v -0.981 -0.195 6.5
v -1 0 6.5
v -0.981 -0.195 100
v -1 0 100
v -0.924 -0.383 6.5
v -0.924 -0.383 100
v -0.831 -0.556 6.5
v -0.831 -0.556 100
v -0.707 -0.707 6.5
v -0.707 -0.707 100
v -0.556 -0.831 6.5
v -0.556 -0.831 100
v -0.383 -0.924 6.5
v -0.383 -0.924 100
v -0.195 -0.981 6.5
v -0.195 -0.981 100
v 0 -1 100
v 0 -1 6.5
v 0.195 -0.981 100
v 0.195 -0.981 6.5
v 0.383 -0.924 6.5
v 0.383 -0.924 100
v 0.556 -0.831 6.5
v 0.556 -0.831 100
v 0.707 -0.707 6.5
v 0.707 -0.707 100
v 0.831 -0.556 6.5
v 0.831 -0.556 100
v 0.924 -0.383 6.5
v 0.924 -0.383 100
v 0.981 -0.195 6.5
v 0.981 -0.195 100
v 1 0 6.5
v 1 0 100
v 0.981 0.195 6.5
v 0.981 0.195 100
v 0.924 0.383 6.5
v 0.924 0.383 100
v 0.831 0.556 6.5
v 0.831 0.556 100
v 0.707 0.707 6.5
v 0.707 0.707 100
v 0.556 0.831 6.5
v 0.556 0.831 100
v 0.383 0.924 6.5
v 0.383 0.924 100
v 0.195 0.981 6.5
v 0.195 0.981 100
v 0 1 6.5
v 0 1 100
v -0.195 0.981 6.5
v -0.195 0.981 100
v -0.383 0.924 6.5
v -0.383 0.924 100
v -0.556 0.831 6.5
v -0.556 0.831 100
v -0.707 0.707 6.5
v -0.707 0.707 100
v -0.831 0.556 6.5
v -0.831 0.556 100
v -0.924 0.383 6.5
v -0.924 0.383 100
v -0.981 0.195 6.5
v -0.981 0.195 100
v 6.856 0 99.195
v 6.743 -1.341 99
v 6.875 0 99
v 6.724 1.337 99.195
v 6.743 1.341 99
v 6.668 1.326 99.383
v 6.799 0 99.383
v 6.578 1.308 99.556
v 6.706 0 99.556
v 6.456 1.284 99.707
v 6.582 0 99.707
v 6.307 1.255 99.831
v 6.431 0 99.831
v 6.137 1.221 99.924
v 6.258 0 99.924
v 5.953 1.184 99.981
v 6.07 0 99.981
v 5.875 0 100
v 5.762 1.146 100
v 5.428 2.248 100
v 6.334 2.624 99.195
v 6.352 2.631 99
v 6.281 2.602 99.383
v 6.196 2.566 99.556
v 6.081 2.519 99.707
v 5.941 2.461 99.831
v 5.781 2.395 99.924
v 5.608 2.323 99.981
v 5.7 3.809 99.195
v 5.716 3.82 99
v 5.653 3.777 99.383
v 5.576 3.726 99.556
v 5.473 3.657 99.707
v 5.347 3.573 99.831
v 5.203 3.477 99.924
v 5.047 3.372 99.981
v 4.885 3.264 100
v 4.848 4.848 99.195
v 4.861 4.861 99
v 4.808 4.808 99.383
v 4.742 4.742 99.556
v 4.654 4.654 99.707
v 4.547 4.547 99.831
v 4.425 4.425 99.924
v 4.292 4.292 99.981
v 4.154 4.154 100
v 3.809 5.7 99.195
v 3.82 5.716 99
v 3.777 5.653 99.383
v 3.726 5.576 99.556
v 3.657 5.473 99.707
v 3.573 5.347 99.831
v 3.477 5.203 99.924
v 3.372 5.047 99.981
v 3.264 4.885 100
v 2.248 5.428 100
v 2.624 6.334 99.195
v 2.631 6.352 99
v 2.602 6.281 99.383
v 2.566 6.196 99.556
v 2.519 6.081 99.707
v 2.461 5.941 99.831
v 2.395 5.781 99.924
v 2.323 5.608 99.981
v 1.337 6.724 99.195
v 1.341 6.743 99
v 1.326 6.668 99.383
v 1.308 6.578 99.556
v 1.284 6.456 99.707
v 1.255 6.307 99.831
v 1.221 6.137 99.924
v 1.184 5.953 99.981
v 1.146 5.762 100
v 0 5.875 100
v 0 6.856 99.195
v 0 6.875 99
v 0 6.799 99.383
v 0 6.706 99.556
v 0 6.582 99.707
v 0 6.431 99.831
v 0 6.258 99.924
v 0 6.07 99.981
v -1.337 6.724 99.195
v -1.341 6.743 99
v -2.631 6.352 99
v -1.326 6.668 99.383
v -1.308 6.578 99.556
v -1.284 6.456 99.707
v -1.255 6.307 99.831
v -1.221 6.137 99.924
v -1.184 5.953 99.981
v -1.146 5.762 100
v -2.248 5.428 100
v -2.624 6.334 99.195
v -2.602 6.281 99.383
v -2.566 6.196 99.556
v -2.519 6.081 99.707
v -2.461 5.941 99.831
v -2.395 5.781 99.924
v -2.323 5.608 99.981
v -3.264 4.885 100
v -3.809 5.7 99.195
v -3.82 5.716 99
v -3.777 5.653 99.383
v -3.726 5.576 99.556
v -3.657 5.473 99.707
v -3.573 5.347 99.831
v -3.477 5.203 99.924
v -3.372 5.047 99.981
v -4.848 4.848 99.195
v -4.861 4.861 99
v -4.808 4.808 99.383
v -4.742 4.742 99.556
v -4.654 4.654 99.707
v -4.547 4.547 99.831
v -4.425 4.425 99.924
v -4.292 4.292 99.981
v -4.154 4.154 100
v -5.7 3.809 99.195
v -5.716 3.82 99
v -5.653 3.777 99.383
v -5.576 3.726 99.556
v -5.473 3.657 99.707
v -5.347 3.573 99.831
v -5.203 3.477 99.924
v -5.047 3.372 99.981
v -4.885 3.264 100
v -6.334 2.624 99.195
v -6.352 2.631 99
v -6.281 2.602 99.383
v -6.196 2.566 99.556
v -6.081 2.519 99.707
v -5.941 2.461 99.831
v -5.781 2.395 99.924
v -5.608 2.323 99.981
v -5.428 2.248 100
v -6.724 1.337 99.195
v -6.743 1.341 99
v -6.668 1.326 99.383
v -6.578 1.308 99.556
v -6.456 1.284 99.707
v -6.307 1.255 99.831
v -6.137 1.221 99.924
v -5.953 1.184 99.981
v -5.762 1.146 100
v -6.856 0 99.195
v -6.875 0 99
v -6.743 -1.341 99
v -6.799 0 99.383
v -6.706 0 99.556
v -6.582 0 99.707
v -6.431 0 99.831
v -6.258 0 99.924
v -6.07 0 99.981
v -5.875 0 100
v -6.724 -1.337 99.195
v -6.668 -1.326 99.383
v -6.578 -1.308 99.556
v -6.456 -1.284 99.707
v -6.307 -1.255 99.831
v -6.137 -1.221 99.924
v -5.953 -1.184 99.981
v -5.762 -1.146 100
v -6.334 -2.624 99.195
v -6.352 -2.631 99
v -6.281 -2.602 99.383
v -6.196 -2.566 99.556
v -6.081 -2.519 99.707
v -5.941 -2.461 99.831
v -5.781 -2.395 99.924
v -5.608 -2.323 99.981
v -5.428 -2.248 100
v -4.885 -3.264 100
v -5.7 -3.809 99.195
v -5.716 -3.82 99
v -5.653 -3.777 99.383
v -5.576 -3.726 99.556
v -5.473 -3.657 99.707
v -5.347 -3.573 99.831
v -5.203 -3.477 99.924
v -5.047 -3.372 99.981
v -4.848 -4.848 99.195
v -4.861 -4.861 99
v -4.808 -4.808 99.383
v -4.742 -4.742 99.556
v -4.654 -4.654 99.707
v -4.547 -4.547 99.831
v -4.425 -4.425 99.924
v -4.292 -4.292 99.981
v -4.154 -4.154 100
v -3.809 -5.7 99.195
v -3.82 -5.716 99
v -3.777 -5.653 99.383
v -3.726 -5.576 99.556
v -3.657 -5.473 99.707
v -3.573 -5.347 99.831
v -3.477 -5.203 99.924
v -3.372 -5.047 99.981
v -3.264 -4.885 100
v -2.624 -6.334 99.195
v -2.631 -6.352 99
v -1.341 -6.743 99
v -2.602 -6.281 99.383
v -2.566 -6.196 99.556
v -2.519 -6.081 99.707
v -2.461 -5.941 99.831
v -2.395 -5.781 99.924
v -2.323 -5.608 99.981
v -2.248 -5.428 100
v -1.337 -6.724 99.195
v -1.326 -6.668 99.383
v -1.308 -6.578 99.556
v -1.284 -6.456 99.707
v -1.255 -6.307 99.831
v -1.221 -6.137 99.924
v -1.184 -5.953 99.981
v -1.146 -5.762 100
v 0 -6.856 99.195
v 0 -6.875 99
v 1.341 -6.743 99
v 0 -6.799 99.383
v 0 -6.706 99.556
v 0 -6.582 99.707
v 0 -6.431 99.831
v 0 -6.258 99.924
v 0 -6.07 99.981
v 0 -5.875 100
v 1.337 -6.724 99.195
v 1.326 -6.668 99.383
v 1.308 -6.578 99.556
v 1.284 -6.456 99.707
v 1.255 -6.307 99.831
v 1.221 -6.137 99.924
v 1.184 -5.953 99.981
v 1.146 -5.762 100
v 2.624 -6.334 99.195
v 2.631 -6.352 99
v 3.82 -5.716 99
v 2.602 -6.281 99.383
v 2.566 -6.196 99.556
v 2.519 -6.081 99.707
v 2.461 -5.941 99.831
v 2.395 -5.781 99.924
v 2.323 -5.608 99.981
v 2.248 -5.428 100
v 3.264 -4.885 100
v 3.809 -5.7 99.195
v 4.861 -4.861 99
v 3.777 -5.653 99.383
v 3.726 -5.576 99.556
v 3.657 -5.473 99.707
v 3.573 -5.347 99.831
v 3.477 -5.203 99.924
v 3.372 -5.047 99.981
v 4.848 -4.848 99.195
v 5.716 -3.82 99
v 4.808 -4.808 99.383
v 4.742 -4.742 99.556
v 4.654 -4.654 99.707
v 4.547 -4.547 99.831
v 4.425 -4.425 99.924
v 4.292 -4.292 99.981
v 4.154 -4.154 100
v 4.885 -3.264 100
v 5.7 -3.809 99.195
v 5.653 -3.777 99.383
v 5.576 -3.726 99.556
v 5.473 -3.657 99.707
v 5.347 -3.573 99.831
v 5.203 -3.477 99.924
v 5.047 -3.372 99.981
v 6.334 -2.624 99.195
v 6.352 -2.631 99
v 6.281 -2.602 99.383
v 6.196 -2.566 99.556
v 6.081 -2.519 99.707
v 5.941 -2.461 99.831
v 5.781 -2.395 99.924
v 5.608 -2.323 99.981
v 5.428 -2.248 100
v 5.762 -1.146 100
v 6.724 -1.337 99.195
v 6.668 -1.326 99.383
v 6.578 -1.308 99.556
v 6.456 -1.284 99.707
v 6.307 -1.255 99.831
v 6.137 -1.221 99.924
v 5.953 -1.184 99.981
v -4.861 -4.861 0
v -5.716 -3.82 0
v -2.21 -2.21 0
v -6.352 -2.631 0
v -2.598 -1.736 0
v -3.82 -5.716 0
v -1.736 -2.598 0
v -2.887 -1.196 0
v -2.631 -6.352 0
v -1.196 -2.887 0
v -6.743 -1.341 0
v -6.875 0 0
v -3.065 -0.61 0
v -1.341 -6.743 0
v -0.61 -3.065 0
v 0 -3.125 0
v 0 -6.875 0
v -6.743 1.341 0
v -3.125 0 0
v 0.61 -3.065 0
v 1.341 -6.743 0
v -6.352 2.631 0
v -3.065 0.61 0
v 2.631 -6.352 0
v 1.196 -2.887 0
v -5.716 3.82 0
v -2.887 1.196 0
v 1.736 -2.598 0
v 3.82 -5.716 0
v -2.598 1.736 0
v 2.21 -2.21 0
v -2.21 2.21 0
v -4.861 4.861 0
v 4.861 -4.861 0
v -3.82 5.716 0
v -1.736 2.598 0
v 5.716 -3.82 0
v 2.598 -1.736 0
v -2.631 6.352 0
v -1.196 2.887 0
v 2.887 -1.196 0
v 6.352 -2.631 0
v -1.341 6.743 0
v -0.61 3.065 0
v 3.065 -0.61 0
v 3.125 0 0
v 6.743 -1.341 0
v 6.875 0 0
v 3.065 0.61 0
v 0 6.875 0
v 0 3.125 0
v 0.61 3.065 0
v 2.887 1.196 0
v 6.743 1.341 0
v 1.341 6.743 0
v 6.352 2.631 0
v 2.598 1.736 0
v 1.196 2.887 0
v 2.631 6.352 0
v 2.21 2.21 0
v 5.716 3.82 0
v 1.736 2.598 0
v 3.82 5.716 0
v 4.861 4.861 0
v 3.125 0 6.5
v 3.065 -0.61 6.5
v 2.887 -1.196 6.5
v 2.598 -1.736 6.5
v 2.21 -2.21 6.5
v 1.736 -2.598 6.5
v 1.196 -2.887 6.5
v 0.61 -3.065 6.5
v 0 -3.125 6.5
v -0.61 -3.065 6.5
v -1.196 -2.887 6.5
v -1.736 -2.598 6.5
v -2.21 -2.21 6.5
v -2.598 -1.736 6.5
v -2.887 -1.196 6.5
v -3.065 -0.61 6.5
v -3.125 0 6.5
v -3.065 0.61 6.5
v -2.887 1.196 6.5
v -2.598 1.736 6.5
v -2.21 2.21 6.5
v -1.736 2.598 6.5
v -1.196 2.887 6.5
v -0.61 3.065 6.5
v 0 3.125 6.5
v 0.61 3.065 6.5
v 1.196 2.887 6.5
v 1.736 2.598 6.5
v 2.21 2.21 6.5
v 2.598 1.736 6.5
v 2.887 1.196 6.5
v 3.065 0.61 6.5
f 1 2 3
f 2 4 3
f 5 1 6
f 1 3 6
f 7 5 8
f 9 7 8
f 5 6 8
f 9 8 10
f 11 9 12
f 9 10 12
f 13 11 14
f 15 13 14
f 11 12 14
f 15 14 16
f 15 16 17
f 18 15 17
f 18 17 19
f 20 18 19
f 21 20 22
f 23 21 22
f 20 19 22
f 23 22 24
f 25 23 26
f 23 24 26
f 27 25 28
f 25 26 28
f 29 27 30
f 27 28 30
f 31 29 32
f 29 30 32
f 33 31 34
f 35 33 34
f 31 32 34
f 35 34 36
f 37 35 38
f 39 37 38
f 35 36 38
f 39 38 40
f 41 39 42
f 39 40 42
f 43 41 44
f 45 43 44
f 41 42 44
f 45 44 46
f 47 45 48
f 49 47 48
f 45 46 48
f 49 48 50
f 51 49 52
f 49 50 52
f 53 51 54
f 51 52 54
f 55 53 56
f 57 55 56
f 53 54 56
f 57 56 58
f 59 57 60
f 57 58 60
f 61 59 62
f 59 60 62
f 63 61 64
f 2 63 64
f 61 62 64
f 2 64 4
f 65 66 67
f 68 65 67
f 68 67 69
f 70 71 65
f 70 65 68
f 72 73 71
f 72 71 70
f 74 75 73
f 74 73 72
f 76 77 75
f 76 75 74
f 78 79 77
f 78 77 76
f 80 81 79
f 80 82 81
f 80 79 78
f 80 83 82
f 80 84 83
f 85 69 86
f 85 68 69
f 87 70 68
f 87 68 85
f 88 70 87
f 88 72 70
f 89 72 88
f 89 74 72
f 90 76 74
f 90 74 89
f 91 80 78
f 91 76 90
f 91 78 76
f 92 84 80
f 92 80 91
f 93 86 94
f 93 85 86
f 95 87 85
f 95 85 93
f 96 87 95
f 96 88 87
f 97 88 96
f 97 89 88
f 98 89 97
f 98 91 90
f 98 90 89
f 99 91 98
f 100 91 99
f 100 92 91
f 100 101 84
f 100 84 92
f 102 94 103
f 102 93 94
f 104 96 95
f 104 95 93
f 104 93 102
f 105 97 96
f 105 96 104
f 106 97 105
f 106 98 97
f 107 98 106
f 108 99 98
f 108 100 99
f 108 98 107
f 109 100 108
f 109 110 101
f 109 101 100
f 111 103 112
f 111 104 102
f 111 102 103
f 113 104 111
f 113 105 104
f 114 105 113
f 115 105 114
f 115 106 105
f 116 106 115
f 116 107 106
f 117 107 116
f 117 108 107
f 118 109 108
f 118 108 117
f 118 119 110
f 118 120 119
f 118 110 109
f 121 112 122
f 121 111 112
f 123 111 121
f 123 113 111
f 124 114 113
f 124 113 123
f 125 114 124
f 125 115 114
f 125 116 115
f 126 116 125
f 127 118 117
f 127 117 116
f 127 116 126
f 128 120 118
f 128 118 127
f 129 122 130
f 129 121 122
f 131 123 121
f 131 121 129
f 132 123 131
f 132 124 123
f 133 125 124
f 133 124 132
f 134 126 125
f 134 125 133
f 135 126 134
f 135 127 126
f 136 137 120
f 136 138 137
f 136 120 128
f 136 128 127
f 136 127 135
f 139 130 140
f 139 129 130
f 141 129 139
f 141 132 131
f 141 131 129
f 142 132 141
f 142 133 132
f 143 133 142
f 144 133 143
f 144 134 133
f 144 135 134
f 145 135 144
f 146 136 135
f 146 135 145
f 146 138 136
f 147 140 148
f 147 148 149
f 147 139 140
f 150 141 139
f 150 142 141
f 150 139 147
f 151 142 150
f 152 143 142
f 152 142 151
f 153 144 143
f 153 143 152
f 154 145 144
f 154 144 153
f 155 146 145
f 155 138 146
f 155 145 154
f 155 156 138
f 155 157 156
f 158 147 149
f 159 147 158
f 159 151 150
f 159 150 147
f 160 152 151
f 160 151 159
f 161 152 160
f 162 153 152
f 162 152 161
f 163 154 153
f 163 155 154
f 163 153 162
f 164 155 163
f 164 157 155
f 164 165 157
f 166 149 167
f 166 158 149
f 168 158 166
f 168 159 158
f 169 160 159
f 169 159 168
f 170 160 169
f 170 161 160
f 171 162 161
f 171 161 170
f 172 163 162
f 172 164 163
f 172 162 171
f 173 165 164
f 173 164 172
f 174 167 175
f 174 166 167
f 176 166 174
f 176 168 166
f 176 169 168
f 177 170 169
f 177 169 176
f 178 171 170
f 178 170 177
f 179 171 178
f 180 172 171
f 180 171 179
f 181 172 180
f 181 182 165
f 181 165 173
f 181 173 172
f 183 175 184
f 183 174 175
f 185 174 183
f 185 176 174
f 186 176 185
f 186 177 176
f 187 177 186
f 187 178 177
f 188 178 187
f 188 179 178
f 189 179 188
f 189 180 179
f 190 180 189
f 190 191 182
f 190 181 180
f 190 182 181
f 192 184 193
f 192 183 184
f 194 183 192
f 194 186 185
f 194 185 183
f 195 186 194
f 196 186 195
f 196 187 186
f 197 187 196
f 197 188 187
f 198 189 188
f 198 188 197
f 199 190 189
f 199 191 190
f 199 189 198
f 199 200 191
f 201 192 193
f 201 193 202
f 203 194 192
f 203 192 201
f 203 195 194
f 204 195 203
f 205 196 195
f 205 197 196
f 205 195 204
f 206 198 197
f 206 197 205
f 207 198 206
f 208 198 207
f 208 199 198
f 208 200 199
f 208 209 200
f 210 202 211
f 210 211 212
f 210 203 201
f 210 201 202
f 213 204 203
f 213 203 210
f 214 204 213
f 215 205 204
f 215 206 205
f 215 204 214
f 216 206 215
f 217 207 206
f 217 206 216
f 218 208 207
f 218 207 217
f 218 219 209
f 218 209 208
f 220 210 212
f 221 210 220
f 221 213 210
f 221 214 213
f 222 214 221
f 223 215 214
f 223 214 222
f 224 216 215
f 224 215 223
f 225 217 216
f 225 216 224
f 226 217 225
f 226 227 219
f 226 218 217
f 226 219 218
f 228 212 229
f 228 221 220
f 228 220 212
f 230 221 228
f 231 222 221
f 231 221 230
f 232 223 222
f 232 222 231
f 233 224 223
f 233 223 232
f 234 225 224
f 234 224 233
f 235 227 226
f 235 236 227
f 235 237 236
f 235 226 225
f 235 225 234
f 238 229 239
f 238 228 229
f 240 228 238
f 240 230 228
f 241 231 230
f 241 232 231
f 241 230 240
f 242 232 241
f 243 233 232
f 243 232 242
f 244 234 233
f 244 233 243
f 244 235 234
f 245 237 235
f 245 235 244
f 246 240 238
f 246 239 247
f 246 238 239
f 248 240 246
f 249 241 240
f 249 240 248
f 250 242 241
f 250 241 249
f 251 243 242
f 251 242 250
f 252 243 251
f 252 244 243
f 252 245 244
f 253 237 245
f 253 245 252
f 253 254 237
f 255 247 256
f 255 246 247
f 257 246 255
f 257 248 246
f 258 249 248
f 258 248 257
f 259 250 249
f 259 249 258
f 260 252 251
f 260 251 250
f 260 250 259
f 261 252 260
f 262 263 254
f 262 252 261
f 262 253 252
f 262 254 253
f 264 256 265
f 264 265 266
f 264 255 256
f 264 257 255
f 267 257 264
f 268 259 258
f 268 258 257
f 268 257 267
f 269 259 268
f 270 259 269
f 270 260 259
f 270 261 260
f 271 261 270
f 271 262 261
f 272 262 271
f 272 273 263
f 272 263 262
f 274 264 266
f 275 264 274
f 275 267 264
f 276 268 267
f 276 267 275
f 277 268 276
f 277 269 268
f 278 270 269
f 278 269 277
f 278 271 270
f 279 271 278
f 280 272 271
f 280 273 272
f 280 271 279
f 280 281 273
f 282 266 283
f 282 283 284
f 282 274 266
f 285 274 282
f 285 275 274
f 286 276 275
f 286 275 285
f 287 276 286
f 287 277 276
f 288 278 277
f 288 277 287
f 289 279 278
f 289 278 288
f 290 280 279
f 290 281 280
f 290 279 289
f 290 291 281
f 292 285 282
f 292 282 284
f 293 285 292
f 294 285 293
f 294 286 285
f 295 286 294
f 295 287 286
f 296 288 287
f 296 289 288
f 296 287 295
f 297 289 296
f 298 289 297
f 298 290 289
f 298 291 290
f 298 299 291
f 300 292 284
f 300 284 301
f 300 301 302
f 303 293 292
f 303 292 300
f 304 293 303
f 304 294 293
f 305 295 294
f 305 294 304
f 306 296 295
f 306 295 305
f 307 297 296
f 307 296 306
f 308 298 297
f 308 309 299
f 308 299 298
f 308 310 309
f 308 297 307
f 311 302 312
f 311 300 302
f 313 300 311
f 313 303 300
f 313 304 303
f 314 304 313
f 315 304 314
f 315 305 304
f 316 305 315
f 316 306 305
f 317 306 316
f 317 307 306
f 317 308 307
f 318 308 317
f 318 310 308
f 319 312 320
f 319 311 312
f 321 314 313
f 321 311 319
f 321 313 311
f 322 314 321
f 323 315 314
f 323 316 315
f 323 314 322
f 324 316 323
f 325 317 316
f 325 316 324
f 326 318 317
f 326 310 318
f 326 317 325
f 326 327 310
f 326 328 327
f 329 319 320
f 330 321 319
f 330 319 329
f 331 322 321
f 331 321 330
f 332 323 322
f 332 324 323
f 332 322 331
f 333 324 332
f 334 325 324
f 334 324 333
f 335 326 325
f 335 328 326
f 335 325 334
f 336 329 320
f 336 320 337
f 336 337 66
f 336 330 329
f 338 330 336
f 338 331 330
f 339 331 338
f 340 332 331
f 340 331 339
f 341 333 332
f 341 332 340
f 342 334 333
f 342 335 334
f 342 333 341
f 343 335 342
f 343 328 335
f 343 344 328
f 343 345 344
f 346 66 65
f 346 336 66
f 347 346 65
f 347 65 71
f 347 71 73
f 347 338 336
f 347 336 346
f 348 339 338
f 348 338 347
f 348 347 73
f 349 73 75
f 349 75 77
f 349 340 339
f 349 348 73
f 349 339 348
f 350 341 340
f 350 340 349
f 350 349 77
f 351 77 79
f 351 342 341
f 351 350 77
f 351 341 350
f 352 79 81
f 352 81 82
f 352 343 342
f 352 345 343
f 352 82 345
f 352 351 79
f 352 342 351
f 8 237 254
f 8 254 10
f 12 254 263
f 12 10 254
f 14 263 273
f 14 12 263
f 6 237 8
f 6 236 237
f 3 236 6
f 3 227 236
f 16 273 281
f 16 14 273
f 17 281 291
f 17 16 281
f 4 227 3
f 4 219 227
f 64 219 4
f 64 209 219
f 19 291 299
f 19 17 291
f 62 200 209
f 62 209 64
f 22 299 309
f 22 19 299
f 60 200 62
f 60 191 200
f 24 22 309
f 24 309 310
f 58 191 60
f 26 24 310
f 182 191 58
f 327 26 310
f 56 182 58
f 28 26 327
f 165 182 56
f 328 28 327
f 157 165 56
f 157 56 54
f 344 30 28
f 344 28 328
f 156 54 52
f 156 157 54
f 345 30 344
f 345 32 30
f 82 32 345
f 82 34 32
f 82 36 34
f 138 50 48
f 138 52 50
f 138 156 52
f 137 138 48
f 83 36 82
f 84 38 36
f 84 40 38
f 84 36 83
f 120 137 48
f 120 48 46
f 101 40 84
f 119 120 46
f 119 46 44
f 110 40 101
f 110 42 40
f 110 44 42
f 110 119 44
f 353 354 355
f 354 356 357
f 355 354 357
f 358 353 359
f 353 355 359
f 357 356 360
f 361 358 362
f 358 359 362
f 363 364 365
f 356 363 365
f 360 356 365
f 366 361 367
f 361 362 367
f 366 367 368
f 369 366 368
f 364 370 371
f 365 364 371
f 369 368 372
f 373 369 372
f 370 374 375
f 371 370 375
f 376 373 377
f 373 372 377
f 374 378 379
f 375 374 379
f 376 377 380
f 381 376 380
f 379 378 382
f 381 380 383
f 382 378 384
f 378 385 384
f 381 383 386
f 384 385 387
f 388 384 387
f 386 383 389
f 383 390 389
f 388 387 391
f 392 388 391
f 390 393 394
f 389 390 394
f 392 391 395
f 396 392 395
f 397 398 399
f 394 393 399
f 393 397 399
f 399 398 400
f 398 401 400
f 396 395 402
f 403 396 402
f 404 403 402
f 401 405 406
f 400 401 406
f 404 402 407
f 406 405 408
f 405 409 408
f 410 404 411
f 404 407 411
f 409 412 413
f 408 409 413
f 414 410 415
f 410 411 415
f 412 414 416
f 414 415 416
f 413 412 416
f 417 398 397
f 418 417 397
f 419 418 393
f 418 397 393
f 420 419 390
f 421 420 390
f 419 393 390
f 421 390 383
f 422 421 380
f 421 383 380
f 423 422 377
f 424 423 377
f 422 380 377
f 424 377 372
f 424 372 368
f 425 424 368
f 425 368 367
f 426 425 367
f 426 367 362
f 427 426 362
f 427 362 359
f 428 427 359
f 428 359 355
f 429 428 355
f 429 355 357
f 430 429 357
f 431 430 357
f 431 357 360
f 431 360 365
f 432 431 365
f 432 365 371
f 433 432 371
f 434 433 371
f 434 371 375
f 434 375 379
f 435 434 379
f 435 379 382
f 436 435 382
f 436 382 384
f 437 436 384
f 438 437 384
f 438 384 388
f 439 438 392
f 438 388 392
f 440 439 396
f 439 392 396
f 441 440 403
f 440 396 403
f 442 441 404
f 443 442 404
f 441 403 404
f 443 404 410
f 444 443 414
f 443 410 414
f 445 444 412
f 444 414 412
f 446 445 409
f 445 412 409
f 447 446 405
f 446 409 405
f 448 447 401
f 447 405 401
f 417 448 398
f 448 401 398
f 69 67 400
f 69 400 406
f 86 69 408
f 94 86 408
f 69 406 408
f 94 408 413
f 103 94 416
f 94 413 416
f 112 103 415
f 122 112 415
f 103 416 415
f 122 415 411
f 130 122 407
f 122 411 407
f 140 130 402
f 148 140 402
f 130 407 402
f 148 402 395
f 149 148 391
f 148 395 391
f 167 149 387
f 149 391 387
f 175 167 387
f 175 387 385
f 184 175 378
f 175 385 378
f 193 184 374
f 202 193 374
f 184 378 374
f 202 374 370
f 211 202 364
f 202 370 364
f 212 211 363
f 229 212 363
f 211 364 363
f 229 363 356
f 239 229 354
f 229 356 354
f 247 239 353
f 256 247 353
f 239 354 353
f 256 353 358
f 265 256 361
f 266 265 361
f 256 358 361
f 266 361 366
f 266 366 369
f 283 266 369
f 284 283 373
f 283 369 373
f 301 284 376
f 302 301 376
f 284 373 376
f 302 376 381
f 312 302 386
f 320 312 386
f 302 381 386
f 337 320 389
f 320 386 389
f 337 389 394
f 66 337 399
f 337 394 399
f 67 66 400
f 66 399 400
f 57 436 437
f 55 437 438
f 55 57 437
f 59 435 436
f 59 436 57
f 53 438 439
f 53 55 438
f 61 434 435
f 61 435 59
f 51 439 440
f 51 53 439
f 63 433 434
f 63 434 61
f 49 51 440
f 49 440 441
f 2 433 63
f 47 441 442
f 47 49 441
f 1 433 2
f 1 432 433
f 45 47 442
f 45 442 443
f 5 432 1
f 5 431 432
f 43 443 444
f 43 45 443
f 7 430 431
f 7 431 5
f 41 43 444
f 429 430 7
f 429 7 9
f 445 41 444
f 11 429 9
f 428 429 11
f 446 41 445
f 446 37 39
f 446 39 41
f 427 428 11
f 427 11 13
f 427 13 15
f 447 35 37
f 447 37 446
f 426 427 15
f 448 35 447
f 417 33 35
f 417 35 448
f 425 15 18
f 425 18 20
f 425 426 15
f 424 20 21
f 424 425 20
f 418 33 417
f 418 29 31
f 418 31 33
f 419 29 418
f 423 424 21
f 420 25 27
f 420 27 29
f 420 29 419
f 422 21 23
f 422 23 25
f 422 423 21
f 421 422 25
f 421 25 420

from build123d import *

# Parameters (mm, degrees)
F0_R           = 6.875
F1_DEPTH       = 100
F3_D           = 2
F3_CBORE_D     = 6.25
F3_CBORE_DEPTH = 6.5
F4_R           = 1


with BuildPart() as f1:
    # F0 (on Top) → F1 (new body)
    with BuildSketch(Plane.XY):
        Circle(F0_R)
    extrude(amount=F1_DEPTH)

    # F3 (through all)
    with Locations(Plane(origin=(0, 0, 0), x_dir=(1, 0, 0), z_dir=(0, 0, -1))):
        with Locations((0, 0)):
            CounterBoreHole(F3_D / 2, F3_CBORE_D / 2, F3_CBORE_DEPTH)

    # F4
    f4_edges = [f1.edges().sort_by_distance(p)[0] for p in [
        (-6.875, 0, 100),
    ]]
    fillet(f4_edges, radius=F4_R)


solid = f1.part
